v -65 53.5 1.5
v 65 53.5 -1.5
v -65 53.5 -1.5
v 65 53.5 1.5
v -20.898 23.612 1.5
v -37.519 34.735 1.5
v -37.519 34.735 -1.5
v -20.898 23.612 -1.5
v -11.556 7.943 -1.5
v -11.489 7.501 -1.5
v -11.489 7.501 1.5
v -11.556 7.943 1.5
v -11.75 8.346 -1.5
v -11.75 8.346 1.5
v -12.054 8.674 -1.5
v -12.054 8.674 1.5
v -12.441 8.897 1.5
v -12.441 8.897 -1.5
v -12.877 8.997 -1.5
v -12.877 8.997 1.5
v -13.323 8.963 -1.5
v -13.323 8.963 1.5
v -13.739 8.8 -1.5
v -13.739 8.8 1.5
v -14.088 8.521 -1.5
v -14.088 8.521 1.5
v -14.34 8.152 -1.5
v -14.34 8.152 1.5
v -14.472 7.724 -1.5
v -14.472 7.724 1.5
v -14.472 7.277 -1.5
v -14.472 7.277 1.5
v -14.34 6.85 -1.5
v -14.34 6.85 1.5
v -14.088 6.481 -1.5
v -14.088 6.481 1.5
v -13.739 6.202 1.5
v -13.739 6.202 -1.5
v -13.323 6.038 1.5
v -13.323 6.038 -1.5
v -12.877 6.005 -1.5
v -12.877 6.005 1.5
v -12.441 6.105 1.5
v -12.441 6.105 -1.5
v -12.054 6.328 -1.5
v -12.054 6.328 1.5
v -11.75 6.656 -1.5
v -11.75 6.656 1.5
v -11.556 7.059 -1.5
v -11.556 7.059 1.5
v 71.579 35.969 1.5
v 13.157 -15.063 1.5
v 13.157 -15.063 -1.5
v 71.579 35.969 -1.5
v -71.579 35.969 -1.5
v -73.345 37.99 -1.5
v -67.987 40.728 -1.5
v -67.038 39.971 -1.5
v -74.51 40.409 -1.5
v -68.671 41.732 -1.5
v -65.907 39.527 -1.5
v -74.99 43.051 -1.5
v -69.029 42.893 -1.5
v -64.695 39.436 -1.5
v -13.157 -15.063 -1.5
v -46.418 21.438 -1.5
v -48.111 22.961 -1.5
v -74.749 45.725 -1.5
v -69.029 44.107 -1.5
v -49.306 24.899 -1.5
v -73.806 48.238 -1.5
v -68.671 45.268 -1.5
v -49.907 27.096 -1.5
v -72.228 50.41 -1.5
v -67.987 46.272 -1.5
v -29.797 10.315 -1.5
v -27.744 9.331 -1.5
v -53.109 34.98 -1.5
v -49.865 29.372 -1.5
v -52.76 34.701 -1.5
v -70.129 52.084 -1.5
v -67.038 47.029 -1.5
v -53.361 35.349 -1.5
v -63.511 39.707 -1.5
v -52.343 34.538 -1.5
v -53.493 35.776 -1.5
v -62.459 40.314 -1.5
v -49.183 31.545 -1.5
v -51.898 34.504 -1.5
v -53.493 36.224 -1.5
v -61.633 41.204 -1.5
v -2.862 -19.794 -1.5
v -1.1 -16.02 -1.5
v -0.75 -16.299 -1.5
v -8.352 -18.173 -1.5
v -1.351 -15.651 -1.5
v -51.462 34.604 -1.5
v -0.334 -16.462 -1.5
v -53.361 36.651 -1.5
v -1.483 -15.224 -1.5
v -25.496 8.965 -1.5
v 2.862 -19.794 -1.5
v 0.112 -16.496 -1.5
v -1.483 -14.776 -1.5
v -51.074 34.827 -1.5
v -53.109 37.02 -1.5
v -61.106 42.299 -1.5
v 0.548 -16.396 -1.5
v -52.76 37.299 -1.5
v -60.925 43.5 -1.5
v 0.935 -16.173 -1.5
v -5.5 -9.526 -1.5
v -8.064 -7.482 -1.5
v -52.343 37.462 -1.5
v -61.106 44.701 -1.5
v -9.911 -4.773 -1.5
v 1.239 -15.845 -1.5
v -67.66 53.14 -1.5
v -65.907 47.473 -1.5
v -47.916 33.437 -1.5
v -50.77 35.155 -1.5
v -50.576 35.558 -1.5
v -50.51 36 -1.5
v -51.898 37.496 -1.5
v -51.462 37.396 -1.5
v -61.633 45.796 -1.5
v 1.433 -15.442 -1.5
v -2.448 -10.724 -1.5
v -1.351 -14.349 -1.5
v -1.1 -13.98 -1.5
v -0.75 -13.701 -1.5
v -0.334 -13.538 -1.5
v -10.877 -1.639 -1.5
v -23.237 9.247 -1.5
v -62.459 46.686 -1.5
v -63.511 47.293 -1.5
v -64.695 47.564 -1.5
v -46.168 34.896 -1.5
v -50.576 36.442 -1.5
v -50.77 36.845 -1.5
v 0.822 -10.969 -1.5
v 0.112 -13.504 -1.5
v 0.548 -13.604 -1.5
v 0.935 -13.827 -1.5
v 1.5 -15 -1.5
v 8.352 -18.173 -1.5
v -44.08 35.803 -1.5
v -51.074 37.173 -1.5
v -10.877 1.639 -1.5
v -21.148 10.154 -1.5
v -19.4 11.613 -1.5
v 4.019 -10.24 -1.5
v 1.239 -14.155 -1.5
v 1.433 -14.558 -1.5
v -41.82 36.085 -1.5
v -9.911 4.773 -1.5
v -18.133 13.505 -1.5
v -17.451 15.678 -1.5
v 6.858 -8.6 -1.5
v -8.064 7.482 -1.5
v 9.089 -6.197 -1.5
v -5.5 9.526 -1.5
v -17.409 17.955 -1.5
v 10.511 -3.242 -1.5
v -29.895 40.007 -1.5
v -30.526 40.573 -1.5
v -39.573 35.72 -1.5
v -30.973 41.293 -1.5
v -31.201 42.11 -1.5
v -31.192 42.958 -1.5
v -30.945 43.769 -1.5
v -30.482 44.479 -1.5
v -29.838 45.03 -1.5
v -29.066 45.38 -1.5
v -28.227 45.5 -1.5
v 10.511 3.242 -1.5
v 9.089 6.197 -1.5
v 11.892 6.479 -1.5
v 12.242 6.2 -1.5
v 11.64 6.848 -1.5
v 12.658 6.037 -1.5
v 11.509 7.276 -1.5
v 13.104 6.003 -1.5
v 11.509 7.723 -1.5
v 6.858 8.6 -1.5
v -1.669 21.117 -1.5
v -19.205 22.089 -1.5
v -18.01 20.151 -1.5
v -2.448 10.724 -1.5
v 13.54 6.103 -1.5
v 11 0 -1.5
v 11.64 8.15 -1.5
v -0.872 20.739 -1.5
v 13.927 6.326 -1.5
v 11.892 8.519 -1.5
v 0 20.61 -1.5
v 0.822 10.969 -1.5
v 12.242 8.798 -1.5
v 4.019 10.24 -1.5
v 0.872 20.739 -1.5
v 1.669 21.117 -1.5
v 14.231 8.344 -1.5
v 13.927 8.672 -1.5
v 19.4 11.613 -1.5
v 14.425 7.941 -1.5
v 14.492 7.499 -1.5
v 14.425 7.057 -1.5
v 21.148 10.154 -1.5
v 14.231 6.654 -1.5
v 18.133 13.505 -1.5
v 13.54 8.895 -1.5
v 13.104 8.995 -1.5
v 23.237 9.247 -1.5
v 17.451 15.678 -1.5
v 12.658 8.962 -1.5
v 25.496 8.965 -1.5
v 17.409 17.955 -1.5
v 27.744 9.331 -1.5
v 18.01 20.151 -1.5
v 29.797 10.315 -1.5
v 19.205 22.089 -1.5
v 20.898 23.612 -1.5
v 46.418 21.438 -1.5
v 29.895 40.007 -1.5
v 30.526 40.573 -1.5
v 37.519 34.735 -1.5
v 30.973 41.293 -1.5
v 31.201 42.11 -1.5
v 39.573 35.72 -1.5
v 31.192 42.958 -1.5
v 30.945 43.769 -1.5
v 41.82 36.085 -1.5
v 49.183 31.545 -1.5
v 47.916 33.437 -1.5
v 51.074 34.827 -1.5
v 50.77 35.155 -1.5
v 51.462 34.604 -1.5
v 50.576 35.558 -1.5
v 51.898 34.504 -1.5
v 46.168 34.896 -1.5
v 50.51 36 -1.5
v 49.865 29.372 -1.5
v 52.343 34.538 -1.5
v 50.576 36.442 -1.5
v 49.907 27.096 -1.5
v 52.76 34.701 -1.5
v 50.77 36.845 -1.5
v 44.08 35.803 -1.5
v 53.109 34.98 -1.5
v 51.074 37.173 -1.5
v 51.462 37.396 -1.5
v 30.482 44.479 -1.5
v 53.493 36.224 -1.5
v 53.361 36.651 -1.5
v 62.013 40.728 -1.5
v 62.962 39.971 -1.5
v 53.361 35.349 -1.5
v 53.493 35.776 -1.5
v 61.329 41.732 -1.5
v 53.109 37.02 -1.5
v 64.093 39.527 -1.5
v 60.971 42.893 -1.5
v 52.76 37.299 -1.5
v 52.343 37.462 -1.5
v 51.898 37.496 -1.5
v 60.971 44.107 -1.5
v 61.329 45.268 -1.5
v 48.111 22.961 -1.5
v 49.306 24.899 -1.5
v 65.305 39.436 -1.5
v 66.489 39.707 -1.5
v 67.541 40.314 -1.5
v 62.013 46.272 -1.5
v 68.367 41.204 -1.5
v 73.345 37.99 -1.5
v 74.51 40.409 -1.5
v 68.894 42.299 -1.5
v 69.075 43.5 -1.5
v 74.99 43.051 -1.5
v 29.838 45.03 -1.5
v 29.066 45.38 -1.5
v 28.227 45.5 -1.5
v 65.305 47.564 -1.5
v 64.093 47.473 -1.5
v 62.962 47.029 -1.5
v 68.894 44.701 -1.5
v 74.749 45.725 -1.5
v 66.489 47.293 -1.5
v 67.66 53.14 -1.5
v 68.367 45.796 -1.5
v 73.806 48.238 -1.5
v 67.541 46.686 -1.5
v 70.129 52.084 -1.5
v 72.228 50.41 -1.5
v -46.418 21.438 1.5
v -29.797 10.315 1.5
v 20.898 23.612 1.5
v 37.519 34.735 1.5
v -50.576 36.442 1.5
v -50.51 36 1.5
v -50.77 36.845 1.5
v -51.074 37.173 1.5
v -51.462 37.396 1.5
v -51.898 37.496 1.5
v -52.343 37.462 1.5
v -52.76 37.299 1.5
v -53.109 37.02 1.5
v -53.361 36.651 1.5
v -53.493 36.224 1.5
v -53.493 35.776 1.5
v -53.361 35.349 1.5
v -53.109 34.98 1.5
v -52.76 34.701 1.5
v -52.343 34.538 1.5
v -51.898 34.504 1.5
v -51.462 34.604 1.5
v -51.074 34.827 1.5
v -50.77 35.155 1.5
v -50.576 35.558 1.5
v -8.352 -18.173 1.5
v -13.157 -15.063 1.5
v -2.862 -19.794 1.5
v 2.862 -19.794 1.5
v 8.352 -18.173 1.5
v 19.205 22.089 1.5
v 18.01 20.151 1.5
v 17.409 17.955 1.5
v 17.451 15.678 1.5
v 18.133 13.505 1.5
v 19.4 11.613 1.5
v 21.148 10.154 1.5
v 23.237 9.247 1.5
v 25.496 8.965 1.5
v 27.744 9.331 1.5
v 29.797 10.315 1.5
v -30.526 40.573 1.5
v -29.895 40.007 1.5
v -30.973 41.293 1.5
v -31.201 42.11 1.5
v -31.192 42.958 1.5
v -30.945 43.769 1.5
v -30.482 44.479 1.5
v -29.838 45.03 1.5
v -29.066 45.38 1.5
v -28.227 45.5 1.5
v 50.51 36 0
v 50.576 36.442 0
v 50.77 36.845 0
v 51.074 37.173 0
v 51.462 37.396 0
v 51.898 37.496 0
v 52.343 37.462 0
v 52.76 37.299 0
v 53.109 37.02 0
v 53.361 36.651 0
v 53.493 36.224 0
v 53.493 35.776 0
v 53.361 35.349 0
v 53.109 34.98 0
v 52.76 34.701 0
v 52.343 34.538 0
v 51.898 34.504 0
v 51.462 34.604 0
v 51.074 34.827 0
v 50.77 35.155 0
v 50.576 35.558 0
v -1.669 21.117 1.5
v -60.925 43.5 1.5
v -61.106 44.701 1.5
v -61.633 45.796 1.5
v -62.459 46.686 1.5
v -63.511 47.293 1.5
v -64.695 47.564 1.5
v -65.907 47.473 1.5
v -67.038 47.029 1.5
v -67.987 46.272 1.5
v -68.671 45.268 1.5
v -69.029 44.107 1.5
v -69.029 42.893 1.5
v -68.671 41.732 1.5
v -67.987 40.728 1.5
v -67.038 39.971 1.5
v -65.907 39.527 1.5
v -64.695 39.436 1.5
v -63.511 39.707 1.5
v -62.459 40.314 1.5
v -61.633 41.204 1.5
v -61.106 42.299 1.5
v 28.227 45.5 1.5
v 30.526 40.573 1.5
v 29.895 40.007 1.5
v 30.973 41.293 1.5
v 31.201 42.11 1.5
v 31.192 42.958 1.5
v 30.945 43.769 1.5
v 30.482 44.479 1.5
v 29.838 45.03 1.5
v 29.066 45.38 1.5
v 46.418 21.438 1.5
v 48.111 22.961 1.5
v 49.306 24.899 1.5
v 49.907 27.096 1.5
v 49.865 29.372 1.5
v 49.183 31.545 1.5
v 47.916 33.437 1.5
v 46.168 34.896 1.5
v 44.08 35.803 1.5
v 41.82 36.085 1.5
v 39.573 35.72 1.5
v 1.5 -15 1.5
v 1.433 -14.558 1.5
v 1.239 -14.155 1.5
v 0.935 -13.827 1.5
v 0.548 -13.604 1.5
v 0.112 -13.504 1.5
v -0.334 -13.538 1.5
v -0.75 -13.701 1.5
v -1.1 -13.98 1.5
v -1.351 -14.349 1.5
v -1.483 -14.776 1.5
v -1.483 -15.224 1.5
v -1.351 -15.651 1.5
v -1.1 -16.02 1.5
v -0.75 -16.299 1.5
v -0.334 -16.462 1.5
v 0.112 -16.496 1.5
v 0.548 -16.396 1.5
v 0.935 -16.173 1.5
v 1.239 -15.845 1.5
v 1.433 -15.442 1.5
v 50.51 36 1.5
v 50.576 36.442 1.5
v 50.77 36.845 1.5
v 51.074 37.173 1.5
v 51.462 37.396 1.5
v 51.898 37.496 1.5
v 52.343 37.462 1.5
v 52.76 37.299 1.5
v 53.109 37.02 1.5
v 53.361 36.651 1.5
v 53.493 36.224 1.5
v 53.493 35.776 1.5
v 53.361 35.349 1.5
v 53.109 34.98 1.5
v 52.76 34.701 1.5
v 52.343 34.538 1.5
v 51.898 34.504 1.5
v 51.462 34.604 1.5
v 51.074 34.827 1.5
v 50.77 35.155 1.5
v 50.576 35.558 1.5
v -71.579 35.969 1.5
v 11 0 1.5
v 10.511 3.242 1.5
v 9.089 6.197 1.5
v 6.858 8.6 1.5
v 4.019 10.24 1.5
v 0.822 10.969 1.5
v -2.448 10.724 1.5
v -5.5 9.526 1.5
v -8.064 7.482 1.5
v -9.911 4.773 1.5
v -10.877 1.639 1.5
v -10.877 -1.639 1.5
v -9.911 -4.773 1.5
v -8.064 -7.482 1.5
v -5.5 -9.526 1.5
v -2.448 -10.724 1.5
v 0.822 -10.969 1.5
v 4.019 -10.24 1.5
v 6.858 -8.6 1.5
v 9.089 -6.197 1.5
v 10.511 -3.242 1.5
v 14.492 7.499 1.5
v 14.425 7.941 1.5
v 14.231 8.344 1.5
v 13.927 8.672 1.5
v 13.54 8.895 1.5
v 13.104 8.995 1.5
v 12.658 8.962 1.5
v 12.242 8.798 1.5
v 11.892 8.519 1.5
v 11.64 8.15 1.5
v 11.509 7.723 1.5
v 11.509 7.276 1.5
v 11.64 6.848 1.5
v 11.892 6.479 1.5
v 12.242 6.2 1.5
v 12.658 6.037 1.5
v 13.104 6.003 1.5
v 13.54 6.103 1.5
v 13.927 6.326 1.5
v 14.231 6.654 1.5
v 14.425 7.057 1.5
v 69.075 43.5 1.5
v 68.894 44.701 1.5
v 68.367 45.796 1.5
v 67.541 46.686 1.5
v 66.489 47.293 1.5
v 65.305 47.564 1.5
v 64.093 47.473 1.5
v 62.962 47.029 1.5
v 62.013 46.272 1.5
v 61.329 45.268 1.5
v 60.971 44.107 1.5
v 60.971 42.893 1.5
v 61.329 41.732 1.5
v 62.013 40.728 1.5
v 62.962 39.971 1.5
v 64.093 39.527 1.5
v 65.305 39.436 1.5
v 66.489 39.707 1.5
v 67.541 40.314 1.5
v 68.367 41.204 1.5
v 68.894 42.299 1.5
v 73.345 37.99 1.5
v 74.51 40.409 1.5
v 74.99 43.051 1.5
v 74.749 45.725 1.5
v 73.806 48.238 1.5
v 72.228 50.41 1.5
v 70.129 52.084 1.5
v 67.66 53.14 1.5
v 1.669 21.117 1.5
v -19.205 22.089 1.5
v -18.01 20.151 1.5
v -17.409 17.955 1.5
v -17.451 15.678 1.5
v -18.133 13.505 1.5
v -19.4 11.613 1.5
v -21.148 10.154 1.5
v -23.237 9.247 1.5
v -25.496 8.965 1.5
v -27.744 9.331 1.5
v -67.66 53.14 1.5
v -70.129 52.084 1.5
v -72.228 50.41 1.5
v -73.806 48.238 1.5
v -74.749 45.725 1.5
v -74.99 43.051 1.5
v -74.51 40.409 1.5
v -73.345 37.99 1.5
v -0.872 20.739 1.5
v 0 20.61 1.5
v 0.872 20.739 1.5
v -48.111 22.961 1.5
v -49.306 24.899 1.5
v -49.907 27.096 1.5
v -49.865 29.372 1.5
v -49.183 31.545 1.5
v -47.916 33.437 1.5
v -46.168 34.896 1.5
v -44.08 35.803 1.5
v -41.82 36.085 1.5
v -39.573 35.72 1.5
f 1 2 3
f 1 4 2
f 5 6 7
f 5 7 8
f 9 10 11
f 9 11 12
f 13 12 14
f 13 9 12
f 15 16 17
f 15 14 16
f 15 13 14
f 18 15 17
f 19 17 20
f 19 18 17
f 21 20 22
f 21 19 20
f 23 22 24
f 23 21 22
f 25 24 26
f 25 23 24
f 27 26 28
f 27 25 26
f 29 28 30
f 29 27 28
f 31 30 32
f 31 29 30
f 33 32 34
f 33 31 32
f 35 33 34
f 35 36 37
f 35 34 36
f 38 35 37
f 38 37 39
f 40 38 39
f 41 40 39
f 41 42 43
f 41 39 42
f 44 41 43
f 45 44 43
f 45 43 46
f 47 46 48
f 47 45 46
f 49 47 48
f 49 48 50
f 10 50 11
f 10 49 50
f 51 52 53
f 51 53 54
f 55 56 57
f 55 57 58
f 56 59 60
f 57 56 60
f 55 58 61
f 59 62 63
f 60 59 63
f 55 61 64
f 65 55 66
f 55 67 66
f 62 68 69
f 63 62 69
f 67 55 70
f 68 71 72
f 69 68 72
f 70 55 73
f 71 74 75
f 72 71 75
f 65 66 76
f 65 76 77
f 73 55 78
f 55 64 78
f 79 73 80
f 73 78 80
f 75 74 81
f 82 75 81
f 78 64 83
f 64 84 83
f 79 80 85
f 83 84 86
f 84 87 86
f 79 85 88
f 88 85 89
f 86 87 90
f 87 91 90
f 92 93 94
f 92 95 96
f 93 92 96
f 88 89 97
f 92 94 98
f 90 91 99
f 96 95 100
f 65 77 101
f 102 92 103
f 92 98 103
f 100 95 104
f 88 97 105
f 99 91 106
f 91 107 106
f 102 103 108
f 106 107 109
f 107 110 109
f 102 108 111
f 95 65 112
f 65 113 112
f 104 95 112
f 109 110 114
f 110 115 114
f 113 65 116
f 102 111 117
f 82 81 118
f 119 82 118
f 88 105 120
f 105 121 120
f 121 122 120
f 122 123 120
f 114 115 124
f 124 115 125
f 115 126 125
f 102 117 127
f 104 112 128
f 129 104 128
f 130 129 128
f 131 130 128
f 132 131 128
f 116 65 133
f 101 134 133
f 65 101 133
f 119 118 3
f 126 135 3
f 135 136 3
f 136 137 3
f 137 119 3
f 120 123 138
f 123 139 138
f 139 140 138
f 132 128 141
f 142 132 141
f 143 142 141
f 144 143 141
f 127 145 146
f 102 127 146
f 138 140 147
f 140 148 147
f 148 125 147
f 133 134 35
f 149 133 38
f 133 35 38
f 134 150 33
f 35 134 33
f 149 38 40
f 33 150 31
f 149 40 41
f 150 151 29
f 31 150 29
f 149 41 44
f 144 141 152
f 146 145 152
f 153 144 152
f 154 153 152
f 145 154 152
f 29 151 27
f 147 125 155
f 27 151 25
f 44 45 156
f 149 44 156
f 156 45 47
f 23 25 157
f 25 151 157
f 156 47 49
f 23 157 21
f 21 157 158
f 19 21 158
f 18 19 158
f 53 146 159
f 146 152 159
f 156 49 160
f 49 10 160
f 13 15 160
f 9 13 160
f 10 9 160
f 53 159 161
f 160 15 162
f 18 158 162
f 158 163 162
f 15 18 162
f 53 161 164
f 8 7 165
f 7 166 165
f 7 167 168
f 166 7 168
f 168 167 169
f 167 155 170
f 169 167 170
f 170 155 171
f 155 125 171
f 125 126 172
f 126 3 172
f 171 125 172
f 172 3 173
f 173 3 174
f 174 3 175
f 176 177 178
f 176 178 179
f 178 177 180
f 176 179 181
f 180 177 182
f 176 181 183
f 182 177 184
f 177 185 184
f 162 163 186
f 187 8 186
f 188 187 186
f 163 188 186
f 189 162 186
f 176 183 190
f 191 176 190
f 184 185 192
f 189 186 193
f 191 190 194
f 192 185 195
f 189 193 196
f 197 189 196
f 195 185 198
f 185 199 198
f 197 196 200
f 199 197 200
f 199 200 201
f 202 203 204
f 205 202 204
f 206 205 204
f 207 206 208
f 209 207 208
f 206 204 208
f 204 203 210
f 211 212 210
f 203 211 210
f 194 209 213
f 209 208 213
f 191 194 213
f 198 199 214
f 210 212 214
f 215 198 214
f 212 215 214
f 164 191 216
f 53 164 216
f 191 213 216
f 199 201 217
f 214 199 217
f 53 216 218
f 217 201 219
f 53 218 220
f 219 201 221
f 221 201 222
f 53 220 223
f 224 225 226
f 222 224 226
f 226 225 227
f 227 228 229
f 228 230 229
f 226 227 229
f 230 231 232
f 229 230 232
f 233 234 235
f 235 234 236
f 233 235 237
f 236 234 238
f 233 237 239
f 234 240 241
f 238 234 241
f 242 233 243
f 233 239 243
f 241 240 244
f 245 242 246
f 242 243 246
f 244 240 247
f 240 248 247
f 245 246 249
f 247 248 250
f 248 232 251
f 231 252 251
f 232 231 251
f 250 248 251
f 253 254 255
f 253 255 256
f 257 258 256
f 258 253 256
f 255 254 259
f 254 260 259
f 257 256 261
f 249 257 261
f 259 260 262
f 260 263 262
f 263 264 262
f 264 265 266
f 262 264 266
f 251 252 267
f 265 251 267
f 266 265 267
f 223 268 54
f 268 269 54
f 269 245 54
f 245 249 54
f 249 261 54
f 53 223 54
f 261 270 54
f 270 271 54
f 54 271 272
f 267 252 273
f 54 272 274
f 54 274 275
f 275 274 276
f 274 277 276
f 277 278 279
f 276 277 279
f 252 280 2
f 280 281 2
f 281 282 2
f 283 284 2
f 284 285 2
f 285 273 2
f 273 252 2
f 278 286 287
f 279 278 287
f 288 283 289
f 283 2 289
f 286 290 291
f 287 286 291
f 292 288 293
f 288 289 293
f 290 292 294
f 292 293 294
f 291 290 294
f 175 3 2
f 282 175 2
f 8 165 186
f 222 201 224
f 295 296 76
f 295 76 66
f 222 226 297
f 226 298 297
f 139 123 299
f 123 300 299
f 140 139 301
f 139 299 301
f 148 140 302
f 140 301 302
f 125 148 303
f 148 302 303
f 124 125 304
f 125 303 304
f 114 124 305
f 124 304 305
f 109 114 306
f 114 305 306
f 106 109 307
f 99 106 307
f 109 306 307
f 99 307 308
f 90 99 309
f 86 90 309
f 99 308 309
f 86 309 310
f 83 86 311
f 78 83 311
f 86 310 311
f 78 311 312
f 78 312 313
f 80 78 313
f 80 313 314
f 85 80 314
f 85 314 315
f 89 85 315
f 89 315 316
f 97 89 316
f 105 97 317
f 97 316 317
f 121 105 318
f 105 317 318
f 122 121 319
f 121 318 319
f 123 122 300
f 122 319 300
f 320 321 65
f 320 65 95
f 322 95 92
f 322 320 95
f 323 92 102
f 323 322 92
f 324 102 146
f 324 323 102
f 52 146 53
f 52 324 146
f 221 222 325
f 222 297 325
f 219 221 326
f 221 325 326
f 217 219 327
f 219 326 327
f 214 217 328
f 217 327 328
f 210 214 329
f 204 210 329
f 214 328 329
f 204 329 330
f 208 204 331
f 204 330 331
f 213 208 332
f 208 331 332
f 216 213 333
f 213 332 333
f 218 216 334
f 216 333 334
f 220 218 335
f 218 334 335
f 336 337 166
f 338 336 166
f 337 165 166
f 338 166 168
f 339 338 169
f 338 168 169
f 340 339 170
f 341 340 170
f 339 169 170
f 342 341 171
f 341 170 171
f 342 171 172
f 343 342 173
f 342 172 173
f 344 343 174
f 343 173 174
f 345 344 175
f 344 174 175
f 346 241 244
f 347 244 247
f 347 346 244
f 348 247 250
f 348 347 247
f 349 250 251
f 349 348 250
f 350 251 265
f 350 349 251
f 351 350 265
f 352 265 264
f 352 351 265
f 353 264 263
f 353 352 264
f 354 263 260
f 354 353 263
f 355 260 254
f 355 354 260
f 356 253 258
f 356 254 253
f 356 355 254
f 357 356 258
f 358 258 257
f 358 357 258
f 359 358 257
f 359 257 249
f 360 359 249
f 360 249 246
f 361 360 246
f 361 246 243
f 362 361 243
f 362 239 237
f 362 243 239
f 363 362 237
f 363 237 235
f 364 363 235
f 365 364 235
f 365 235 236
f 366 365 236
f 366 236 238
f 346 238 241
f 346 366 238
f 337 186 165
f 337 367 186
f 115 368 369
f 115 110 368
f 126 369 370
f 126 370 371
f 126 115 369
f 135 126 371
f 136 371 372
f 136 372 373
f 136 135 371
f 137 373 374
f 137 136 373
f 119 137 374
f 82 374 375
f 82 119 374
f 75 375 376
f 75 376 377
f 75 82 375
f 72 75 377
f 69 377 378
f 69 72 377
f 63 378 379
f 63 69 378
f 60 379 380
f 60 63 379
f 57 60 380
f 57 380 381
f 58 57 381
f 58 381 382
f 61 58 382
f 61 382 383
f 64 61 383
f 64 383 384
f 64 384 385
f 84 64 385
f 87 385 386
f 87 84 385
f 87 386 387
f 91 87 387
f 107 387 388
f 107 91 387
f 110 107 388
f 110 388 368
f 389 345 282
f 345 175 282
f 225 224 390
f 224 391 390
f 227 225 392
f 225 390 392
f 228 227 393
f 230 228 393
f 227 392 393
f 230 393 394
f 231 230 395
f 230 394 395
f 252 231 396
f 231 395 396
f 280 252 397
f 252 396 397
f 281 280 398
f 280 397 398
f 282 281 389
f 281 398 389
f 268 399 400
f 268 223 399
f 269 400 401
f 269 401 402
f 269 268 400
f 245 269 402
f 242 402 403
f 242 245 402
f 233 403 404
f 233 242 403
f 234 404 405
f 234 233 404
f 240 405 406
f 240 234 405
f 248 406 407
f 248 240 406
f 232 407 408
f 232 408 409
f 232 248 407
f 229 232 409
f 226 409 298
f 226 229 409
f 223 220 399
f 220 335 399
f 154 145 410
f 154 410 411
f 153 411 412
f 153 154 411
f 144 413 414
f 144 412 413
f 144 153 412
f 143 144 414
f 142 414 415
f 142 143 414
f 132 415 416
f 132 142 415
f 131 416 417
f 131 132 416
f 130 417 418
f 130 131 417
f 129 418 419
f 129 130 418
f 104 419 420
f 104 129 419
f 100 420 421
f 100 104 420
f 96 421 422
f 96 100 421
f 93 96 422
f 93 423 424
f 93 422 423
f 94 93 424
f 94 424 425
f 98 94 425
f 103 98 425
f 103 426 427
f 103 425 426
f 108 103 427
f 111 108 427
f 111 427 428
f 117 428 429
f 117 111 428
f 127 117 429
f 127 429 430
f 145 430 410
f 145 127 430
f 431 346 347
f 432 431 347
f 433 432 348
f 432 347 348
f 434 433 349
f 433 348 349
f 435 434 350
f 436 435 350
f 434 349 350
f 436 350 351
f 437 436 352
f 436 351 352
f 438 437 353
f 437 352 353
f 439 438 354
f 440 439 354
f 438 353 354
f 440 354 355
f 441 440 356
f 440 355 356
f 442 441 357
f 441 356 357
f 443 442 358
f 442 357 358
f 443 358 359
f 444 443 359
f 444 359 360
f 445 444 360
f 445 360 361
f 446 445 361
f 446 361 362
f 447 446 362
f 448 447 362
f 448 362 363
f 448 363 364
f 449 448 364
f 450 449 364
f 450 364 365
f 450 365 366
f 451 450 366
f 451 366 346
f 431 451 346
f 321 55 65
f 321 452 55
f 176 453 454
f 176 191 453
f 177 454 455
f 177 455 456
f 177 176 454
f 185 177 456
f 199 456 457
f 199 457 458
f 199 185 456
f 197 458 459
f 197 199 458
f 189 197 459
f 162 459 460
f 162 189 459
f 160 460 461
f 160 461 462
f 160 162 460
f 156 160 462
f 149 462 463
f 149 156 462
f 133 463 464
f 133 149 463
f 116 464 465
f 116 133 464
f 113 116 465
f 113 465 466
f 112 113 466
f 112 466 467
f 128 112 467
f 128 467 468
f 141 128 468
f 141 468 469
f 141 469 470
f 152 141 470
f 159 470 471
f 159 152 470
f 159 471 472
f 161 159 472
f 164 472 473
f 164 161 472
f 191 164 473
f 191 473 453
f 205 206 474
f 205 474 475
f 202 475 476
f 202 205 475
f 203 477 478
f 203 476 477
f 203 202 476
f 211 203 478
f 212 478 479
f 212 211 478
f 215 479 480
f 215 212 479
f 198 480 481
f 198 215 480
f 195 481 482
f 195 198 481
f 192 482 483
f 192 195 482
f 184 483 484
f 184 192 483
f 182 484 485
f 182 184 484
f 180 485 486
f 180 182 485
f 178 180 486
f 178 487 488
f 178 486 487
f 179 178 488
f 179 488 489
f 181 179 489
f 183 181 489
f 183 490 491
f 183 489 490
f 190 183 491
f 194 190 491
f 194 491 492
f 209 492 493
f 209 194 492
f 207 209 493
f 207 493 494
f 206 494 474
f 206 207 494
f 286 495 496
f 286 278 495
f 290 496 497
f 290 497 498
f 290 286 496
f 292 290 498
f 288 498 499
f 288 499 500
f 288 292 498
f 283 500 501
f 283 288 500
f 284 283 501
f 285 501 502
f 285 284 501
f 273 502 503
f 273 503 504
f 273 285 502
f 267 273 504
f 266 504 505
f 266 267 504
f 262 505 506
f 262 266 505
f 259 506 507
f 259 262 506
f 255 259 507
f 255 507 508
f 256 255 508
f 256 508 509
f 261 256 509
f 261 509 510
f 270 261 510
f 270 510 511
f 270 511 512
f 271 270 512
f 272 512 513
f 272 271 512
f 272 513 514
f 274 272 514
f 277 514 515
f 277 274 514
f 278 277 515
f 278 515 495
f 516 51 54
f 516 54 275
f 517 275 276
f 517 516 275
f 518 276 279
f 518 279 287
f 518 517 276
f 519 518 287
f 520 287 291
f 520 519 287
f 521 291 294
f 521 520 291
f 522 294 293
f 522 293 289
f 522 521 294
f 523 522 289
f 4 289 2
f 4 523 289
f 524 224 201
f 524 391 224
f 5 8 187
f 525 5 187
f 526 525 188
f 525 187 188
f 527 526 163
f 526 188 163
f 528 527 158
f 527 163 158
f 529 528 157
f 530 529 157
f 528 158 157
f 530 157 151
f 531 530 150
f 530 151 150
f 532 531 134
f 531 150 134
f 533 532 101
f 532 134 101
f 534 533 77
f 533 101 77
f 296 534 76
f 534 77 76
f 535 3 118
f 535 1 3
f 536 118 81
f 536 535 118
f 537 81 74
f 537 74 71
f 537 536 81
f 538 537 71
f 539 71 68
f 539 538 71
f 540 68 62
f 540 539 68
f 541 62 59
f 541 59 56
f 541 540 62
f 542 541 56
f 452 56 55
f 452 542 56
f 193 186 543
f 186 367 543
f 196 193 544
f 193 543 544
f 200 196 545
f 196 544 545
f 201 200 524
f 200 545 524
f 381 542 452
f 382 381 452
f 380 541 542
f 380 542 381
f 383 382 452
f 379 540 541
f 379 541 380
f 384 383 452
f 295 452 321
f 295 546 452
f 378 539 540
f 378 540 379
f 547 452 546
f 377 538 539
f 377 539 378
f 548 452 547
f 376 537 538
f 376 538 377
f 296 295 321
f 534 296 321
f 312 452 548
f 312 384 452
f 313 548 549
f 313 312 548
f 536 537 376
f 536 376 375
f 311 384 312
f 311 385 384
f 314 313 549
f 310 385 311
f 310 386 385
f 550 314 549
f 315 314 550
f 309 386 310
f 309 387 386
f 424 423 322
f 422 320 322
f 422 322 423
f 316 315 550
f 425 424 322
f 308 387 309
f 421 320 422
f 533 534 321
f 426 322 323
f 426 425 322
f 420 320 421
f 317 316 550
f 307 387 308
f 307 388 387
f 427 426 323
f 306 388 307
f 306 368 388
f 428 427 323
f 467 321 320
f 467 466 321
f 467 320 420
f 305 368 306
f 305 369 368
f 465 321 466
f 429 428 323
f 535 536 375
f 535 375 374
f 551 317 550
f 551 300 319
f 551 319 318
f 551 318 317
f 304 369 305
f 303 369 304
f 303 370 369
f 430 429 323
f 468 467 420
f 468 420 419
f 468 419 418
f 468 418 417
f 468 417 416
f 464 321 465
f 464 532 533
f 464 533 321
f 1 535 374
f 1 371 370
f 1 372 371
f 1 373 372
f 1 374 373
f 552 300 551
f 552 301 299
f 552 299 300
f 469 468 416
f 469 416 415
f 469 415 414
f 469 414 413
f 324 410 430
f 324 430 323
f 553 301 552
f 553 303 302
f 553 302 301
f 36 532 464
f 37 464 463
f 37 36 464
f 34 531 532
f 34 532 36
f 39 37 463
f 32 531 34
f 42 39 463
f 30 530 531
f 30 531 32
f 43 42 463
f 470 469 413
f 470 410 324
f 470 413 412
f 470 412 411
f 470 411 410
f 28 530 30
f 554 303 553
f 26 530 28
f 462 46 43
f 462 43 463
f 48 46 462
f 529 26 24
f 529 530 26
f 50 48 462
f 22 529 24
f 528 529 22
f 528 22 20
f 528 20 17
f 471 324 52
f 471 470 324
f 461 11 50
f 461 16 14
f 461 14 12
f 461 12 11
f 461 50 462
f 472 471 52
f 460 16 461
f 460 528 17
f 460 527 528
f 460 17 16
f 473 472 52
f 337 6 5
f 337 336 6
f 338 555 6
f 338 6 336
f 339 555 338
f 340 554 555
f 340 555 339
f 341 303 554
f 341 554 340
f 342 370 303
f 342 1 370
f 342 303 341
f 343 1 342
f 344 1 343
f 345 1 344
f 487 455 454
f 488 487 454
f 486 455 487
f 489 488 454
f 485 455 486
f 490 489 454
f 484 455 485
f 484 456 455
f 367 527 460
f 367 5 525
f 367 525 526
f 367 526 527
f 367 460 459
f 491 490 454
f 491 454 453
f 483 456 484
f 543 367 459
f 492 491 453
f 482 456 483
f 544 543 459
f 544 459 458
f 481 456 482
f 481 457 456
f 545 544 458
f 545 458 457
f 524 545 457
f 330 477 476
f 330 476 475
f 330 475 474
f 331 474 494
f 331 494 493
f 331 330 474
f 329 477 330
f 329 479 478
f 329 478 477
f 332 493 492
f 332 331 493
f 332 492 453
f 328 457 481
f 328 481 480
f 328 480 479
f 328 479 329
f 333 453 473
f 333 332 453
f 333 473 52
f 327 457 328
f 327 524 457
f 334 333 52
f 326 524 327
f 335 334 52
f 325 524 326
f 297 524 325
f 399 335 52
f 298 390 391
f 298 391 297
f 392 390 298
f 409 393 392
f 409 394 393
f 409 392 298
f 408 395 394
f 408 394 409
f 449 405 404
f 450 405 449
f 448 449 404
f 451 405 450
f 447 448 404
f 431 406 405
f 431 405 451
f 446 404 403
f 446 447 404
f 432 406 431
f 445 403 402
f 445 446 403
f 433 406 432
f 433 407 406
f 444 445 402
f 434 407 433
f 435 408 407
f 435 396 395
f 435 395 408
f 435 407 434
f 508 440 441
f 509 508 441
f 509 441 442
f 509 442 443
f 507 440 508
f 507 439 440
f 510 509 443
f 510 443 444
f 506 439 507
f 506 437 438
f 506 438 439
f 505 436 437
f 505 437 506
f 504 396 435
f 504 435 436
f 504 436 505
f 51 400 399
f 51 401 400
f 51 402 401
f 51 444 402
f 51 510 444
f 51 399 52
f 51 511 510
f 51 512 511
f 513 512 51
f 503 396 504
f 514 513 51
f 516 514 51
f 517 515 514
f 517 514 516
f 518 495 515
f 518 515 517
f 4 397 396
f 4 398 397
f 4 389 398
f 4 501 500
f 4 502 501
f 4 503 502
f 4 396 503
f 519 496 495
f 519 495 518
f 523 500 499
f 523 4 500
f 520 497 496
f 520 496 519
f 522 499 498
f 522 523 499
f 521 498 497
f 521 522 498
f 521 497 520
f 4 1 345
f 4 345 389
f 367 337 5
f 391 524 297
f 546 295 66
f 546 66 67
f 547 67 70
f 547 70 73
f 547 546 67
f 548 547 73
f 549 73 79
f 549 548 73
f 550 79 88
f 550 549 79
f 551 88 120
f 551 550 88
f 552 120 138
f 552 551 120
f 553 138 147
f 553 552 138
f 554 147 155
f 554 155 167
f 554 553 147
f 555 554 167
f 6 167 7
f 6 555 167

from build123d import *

# Parameters (mm, degrees)
SKETCH1_R               = 11
SKETCH1_R_2             = 4.075
BOSS_EXTRUDE1_DEPTH     = 1.5
CUT_EXTRUDE1_DEPTH      = 93.138482731
CUT_EXTRUDE1_DEPTH_BACK = 93.138482731
SKETCH2_R               = 1.5
SKETCH3_R               = 1.5
CUT_EXTRUDE2_DEPTH      = 93.138482731
FILLET2_R               = 3


with BuildPart() as part:
    # Sketch1 → Boss-Extrude1 (new, symmetric)
    with BuildSketch(Plane.XY):
        with BuildLine():
            Line((-71.578668004, 35.968657006), (-13.157336008, -15.062685988))
            ThreePointArc((-13.157336008, -15.062685988), (0, -20), (13.157336008, -15.062685988))
            Line((13.157336008, -15.062685988), (71.578668004, 35.968657006))
            ThreePointArc((71.578668004, 35.968657006), (74.362516487, 47.013301158), (65, 53.5))
            Line((65, 53.5), (-65, 53.5))
            ThreePointArc((-65, 53.5), (-74.362516487, 47.013301158), (-71.578668004, 35.968657006))
        make_face()
        Circle(SKETCH1_R, mode=Mode.SUBTRACT)
        with Locations((-65, 43.5)):
            Circle(SKETCH1_R_2, mode=Mode.SUBTRACT)
        with Locations((65, 43.5)):
            Circle(SKETCH1_R_2, mode=Mode.SUBTRACT)
        Polygon((-38.103448276, 45.5), (38.103448276, 45.5), (0, 20), align=None, mode=Mode.SUBTRACT)
        with BuildLine():
            Line((-37.519409883, 34.735340535), (-20.898100342, 23.611848765))
            ThreePointArc((-20.898100342, 23.611848765), (-18.698973233, 12.513928241), (-29.796893758, 10.314801132))
            Line((-29.796893758, 10.314801132), (-46.418203298, 21.438292902))
            ThreePointArc((-46.418203298, 21.438292902), (-48.617330407, 32.536213426), (-37.519409883, 34.735340535))
        make_face(mode=Mode.SUBTRACT)
        with BuildLine():
            Line((37.519409883, 34.735340535), (20.898100342, 23.611848765))
            ThreePointArc((20.898100342, 23.611848765), (18.698973233, 12.513928241), (29.796893758, 10.314801132))
            Line((29.796893758, 10.314801132), (46.418203298, 21.438292902))
            ThreePointArc((46.418203298, 21.438292902), (48.617330407, 32.536213426), (37.519409883, 34.735340535))
        make_face(mode=Mode.SUBTRACT)
    extrude(amount=BOSS_EXTRUDE1_DEPTH, both=True)

    # Sketch2 → Cut-Extrude1 (cut, two sides: drawn at the far end of the back side and taken through both)
    with BuildSketch(Plane.XY.offset(-CUT_EXTRUDE1_DEPTH_BACK)):
        with Locations((0, -15)):
            Circle(SKETCH2_R)
        with Locations((-12.988881057, 7.500866025)):
            Circle(SKETCH2_R)
        with Locations((12.991881057, 7.499133975)):
            Circle(SKETCH2_R)
    extrude(amount=CUT_EXTRUDE1_DEPTH + CUT_EXTRUDE1_DEPTH_BACK, mode=Mode.SUBTRACT)

    # Sketch3 → Cut-Extrude2 (cut, symmetric)
    with BuildSketch(Plane.XY):
        with Locations((-65, 58.5)):
            Circle(SKETCH3_R)
        with Locations((-52.009618943, 36)):
            Circle(SKETCH3_R)
        with Locations((-77.990381057, 36)):
            Circle(SKETCH3_R)
    cut_extrude2 = extrude(amount=CUT_EXTRUDE2_DEPTH, both=True, mode=Mode.SUBTRACT)

    # Mirror1: Cut-Extrude2 across plane
    add(cut_extrude2.mirror(Plane(origin=(0, 0, 0), x_dir=(0, 0, 1), z_dir=(1, 0, 0))), mode=Mode.SUBTRACT)

    # Fillet2
    fillet2_edges = [part.edges().sort_by_distance(p)[0] for p in [
        (0, 20, 0),
        (38.103448276, 45.5, 0),
        (-38.103448276, 45.5, 0),
    ]]
    fillet(fillet2_edges, radius=FILLET2_R)


solid = part.part
